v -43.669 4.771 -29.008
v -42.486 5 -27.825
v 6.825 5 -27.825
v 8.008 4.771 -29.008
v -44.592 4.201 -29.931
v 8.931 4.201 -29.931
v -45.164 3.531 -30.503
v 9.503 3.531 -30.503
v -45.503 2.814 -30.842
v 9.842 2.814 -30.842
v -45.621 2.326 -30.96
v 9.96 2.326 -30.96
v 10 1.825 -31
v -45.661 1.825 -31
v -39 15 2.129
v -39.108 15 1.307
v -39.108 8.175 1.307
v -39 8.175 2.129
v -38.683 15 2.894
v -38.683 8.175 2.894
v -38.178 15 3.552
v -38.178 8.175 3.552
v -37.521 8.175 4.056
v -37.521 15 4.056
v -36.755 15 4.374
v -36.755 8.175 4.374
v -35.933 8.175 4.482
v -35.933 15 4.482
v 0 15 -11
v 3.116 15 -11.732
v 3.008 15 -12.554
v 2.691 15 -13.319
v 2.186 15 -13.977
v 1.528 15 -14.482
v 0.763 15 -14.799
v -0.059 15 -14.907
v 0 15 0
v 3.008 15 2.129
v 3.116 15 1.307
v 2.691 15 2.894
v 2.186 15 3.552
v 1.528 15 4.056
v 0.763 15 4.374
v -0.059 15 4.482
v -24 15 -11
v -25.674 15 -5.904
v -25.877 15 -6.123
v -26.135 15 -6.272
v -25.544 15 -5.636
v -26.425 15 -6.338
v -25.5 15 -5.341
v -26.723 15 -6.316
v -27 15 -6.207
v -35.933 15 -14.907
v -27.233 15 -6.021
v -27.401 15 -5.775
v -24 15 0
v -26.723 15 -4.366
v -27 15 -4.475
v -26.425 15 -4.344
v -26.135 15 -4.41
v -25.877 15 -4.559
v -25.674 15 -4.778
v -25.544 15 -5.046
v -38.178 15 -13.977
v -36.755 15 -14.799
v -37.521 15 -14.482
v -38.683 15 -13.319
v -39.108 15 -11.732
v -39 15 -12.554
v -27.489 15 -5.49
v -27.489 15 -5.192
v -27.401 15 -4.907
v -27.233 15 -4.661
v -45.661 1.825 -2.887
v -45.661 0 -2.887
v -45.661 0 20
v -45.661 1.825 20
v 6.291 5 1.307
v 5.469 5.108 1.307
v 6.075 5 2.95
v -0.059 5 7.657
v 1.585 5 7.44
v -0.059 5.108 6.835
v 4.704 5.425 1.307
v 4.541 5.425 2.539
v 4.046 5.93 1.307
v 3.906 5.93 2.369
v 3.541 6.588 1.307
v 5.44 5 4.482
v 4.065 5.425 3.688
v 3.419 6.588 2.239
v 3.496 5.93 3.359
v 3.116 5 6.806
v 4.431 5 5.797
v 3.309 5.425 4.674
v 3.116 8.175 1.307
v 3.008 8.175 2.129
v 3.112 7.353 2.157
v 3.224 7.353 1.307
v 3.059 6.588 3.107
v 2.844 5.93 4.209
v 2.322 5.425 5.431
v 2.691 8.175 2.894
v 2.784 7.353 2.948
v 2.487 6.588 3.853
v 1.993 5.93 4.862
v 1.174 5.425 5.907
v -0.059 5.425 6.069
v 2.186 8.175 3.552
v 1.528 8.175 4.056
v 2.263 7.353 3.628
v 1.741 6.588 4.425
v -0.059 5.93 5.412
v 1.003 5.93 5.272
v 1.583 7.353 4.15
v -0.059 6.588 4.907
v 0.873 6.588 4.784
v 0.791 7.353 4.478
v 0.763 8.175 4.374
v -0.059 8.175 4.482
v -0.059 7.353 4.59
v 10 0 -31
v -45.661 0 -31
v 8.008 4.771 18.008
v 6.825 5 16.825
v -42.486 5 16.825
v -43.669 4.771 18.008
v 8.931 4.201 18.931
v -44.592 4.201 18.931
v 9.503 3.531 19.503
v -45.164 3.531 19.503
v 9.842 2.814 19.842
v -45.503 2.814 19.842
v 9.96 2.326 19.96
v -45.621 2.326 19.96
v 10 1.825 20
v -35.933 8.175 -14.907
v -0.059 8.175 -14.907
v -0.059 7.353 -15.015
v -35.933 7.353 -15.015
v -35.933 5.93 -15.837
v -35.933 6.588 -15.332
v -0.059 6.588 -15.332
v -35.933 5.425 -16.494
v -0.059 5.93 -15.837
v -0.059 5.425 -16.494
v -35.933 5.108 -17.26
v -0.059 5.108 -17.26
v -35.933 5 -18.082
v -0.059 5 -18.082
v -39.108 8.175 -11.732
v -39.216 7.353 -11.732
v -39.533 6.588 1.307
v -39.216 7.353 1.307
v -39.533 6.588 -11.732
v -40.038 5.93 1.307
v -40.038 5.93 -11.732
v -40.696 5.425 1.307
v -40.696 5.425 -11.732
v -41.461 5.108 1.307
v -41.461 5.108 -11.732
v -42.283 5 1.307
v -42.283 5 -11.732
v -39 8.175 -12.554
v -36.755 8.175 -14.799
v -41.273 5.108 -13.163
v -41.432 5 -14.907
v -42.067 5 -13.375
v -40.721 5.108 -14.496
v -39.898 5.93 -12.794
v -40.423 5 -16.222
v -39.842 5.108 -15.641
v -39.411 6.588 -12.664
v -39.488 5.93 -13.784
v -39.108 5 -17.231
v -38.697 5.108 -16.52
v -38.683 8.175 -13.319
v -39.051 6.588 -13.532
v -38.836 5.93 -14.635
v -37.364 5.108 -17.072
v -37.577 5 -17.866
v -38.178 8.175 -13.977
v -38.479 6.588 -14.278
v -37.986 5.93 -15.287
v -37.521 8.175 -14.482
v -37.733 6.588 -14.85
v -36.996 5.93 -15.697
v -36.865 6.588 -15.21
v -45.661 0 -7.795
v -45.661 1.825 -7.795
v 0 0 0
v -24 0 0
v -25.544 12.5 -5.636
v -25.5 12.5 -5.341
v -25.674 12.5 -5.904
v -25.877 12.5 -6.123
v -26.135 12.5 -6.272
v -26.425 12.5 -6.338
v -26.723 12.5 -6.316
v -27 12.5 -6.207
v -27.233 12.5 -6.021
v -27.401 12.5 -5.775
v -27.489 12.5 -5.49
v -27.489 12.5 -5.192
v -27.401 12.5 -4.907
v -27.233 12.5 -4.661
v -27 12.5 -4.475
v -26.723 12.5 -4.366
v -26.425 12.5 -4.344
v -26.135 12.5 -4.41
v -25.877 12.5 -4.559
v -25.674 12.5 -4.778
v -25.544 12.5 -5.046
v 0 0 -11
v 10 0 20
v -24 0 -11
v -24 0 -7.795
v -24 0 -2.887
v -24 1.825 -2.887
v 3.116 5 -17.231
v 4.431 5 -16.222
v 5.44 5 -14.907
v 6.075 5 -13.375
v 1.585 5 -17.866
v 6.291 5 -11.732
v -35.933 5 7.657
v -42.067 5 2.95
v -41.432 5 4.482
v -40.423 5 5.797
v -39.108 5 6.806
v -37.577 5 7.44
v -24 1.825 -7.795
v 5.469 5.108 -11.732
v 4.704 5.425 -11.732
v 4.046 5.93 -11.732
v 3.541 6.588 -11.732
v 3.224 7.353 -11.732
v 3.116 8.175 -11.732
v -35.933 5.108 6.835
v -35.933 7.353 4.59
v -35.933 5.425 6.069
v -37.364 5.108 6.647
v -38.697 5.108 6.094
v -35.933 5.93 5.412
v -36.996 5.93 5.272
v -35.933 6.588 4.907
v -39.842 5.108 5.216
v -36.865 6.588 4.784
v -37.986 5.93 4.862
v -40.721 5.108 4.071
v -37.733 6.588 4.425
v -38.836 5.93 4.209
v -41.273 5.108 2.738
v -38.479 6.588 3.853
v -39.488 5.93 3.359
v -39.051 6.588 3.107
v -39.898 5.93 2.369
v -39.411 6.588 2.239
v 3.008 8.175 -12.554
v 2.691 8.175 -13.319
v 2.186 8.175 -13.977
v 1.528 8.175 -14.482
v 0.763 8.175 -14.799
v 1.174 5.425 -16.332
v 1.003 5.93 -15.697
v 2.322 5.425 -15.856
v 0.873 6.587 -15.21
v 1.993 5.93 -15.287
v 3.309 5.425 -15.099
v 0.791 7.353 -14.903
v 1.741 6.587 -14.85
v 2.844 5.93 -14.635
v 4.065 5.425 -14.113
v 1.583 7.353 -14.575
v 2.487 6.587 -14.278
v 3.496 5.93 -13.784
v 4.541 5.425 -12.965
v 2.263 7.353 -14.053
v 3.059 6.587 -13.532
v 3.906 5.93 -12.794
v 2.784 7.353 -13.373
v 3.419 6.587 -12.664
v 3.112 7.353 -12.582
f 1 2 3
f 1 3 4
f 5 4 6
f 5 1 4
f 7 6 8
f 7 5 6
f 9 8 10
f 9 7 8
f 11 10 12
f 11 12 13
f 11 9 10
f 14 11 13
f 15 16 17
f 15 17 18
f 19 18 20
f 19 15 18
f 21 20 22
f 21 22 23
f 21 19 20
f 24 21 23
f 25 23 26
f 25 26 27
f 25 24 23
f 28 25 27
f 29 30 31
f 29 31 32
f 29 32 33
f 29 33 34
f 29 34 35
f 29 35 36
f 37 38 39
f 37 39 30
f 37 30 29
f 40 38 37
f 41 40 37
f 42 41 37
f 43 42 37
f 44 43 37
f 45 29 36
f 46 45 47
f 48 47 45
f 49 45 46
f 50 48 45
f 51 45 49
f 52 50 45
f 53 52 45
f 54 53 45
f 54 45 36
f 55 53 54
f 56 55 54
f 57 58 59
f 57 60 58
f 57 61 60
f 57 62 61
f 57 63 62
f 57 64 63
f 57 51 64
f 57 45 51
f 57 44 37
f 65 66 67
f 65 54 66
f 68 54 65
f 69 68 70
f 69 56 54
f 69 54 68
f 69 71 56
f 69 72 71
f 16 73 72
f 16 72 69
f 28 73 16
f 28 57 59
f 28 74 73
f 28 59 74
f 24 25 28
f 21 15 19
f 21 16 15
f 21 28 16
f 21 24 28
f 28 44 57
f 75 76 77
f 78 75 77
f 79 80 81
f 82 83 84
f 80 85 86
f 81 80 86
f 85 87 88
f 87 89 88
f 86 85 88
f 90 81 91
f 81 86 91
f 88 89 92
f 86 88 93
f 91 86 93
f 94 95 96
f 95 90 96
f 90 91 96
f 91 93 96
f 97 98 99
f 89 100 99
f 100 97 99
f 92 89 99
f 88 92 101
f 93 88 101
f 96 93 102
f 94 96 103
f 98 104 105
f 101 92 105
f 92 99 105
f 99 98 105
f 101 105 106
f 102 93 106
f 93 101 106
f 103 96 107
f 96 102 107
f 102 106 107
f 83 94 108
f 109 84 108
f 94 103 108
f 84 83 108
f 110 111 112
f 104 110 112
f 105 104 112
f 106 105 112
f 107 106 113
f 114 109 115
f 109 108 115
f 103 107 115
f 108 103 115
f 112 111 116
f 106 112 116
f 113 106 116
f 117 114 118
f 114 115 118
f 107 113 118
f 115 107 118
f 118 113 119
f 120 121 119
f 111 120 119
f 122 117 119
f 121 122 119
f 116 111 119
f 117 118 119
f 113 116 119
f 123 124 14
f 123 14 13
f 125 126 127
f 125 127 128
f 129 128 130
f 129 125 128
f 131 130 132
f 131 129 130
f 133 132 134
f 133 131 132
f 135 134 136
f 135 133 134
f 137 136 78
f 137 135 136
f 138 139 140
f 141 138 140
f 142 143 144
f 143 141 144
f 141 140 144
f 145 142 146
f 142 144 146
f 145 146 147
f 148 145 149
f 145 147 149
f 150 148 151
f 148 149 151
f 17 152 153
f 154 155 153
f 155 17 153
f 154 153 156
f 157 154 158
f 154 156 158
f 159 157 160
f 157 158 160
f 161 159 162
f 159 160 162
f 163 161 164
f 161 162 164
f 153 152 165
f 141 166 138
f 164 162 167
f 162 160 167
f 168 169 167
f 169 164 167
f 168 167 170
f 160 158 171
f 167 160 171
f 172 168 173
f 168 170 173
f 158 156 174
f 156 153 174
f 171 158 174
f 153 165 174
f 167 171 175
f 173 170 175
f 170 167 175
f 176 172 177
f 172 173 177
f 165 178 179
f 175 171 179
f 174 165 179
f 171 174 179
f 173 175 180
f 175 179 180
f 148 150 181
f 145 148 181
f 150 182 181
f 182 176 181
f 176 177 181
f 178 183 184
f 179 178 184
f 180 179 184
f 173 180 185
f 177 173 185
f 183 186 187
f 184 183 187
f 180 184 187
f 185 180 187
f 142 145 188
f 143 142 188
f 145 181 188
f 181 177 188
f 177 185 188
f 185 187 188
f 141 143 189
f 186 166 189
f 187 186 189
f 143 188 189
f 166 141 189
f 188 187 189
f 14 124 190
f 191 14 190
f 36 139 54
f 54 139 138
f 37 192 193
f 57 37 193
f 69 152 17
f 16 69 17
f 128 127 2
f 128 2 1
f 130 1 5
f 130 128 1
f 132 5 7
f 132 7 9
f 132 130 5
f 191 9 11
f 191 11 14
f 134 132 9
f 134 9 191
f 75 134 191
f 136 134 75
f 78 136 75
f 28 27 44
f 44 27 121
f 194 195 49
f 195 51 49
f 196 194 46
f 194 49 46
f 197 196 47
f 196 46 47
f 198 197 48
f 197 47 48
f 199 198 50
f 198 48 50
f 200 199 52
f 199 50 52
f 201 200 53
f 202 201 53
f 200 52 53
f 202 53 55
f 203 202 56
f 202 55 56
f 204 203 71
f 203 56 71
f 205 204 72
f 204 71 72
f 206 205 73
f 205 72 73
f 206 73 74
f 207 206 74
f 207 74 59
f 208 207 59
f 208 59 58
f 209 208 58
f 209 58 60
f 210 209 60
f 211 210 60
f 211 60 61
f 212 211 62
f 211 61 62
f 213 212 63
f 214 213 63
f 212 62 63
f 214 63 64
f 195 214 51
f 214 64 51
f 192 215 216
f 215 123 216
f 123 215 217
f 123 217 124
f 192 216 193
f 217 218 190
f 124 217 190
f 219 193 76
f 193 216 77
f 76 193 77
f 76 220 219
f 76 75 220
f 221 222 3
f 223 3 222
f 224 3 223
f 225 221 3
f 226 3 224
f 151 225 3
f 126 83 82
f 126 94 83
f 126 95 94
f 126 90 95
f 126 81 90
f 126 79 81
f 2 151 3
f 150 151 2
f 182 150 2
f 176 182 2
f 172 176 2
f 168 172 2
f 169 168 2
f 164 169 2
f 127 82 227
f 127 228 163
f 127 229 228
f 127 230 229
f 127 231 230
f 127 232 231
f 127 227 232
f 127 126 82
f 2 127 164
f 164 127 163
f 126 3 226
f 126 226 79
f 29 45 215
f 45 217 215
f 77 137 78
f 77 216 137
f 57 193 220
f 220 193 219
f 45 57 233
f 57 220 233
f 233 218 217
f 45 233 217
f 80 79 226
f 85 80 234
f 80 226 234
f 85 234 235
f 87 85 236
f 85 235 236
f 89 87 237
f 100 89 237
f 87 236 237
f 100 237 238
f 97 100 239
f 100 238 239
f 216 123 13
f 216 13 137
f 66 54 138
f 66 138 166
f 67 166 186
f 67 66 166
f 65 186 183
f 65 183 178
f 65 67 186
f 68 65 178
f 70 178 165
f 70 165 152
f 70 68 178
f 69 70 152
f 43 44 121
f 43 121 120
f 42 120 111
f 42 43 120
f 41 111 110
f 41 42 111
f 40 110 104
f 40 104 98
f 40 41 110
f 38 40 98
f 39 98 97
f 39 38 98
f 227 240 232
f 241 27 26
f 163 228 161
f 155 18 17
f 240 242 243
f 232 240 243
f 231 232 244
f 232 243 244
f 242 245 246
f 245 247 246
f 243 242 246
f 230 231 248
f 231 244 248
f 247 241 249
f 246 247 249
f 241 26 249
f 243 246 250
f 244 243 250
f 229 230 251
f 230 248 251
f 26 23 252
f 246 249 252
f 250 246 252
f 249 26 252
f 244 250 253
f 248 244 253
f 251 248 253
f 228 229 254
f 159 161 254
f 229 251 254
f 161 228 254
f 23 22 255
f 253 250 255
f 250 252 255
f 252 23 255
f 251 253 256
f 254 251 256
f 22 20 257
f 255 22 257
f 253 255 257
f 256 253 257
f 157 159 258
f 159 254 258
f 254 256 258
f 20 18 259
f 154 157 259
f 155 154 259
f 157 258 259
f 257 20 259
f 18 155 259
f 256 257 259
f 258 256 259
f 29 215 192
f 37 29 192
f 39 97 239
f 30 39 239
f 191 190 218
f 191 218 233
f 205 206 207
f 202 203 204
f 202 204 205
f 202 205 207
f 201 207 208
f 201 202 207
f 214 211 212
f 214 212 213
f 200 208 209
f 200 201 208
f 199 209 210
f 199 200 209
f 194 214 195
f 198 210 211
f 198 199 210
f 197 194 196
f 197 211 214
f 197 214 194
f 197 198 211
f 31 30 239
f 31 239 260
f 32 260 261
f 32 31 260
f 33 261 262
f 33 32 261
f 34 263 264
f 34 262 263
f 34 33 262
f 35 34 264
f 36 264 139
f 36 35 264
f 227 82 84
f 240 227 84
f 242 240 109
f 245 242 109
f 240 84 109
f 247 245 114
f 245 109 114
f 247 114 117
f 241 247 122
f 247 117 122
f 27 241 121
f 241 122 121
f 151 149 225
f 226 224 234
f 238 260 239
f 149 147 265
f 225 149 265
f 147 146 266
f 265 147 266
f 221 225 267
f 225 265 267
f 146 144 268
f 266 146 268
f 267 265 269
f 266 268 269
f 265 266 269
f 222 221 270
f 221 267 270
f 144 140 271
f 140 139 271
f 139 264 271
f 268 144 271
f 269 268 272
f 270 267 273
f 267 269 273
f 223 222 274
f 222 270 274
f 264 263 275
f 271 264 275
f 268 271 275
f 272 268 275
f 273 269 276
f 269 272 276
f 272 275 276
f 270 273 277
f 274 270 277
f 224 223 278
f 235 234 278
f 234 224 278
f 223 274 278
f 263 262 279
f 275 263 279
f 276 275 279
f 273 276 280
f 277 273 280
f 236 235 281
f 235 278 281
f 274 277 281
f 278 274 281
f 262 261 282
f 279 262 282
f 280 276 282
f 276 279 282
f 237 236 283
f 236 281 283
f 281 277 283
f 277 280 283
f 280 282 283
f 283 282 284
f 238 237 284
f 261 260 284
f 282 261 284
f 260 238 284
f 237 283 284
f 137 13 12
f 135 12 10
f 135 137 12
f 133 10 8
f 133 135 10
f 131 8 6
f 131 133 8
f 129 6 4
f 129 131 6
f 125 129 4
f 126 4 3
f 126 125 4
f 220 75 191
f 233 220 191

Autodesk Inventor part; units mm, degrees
ref_plane "YZ Plane" through (0, 0, 0) normal (1, 0, 0) x (0, 1, 0)
ref_plane "XZ Plane" through (0, 0, 0) normal (0, 1, 0) x (-1, 0, 0)
ref_plane "XY Plane" through (0, 0, 0) normal (0, 0, 1) x (1, 0, 0)
sketch "Sketch1" plane through (0, 0, 0) normal (0, 1, 0) x (-1, 0, 0)
  line L0 (0, 0) -> (24, 0)
  line L1 (24, 0) -> (24, -11)
  line L2 (24, -11) -> (0, -11)
  line L3 (0, -11) -> (0, 0)
  line L4 (24, -11) -> (35.6612, -11)
  line L5 (35.6612, -11) -> (35.6612, 0)
  line L6 (35.6612, 0) -> (24, 0)
  line L7 (24, 0) -> (24, -11)
  line L8 (0, 0) -> (0, 20)
  line L9 (0, -11) -> (0, -31)
  line L10 (0, -31) -> (-10, -31)
  line L11 (-10, -31) -> (-10, 20)
  line L12 (-10, 20) -> (0, 20)
  line L13 (35.6612, 0) -> (45.6612, 0)
  line L14 (45.6612, 0) -> (45.6612, 20)
  line L15 (45.6612, 20) -> (0, 20)
  line L16 (45.6612, 0) -> (45.6612, -31)
  line L17 (45.6612, -31) -> (0, -31)
  line L18 (39.1081, 4.4818) -> (-3.116, 4.4818)
  line L19 (-3.116, 4.4818) -> (-3.116, -14.9069)
  line L20 (-3.116, -14.9069) -> (39.1081, -14.9069)
  line L21 (39.1081, -14.9069) -> (39.1081, 4.4818)
  dimension "d0" = 24
  dimension "d1" = 11
  dimension "d2" = 20
  dimension "d3" = 20
  dimension "d4" = 10
  dimension "d6" = 10
extrude "Extrusion1" add sketch "Sketch1" along normal blind 15 contours L8 L18 L21 L13 L6 L0 | L3 L9 L20 L19 L18 L8 | L6 L5 L4 L1 | L2 L4 L5 L13 L21 L20 L9
extrude "Extrusion2" add sketch "Sketch1" along normal blind 5 contours L18 L19 L20 L9 L10 L11 L12 L8 | L8 L15 L14 L13 L21 L18 | L20 L21 L13 L16 L17 L9
fillet "Fillet1" radius 3.175 12 edges at (-17.8306, 5, 20) (10, 5, -5.5) (-17.8306, 5, -31) (-45.6612, 5, -5.5) (-17.996, 5, -14.9069) (-39.1081, 5, -5.2126) (-17.996, 5, 4.4818) (3.116, 5, -5.2126) (-39.1081, 10, -14.9069) (-39.1081, 10, 4.4818) (3.116, 10, -14.9069) (3.116, 10, 4.4818)
sketch "Sketch2" plane through (-45.6612, 0, -31) normal (-1, 0, 0) x (0, 0, 1)
  line L0 (51, 1.825) -> (0, 1.825) projected
  line L1 (20, 0) -> (31, 0) projected
  line L2 (23.2049, 1.825) -> (28.1129, 1.825)
  line L3 (28.1129, 1.825) -> (28.1129, 0)
  line L4 (28.1129, 0) -> (23.2049, 0)
  line L5 (23.2049, 0) -> (23.2049, 1.825)
extrude "Extrusion3" cut sketch "Sketch2" against normal blind 25
sketch "Sketch3" plane through (0, 15, 0) normal (0, 1, 0) x (1, 0, 0)
  line L0 (0, 0) -> (-24, 0) projected
  line L1 (-24, 11) -> (0, 11) projected
  line L2 (-24, 0) -> (-24, 11)
  line L3 (0, 11) -> (0, 0) projected
  line L4 (-24, 11) -> (0, 11)
  line L5 (0, 11) -> (0, 0)
  line L6 (0, 5.5) -> (2.5, 5.5)
  line L7 (-24, 2.8871) -> (-24, 7.7951) projected
  line L8 (-24, 5.3411) -> (-26.5, 5.3411)
  circle A0 centre (-26.5, 5.3411) radius 1
  dimension "d14" = 2.5
  dimension "d15" = 2.5
  dimension "d16" = 2
extrude "Extrusion4" cut sketch "Sketch3" against normal blind 2.5 contours A0
properties part number "turret x"
